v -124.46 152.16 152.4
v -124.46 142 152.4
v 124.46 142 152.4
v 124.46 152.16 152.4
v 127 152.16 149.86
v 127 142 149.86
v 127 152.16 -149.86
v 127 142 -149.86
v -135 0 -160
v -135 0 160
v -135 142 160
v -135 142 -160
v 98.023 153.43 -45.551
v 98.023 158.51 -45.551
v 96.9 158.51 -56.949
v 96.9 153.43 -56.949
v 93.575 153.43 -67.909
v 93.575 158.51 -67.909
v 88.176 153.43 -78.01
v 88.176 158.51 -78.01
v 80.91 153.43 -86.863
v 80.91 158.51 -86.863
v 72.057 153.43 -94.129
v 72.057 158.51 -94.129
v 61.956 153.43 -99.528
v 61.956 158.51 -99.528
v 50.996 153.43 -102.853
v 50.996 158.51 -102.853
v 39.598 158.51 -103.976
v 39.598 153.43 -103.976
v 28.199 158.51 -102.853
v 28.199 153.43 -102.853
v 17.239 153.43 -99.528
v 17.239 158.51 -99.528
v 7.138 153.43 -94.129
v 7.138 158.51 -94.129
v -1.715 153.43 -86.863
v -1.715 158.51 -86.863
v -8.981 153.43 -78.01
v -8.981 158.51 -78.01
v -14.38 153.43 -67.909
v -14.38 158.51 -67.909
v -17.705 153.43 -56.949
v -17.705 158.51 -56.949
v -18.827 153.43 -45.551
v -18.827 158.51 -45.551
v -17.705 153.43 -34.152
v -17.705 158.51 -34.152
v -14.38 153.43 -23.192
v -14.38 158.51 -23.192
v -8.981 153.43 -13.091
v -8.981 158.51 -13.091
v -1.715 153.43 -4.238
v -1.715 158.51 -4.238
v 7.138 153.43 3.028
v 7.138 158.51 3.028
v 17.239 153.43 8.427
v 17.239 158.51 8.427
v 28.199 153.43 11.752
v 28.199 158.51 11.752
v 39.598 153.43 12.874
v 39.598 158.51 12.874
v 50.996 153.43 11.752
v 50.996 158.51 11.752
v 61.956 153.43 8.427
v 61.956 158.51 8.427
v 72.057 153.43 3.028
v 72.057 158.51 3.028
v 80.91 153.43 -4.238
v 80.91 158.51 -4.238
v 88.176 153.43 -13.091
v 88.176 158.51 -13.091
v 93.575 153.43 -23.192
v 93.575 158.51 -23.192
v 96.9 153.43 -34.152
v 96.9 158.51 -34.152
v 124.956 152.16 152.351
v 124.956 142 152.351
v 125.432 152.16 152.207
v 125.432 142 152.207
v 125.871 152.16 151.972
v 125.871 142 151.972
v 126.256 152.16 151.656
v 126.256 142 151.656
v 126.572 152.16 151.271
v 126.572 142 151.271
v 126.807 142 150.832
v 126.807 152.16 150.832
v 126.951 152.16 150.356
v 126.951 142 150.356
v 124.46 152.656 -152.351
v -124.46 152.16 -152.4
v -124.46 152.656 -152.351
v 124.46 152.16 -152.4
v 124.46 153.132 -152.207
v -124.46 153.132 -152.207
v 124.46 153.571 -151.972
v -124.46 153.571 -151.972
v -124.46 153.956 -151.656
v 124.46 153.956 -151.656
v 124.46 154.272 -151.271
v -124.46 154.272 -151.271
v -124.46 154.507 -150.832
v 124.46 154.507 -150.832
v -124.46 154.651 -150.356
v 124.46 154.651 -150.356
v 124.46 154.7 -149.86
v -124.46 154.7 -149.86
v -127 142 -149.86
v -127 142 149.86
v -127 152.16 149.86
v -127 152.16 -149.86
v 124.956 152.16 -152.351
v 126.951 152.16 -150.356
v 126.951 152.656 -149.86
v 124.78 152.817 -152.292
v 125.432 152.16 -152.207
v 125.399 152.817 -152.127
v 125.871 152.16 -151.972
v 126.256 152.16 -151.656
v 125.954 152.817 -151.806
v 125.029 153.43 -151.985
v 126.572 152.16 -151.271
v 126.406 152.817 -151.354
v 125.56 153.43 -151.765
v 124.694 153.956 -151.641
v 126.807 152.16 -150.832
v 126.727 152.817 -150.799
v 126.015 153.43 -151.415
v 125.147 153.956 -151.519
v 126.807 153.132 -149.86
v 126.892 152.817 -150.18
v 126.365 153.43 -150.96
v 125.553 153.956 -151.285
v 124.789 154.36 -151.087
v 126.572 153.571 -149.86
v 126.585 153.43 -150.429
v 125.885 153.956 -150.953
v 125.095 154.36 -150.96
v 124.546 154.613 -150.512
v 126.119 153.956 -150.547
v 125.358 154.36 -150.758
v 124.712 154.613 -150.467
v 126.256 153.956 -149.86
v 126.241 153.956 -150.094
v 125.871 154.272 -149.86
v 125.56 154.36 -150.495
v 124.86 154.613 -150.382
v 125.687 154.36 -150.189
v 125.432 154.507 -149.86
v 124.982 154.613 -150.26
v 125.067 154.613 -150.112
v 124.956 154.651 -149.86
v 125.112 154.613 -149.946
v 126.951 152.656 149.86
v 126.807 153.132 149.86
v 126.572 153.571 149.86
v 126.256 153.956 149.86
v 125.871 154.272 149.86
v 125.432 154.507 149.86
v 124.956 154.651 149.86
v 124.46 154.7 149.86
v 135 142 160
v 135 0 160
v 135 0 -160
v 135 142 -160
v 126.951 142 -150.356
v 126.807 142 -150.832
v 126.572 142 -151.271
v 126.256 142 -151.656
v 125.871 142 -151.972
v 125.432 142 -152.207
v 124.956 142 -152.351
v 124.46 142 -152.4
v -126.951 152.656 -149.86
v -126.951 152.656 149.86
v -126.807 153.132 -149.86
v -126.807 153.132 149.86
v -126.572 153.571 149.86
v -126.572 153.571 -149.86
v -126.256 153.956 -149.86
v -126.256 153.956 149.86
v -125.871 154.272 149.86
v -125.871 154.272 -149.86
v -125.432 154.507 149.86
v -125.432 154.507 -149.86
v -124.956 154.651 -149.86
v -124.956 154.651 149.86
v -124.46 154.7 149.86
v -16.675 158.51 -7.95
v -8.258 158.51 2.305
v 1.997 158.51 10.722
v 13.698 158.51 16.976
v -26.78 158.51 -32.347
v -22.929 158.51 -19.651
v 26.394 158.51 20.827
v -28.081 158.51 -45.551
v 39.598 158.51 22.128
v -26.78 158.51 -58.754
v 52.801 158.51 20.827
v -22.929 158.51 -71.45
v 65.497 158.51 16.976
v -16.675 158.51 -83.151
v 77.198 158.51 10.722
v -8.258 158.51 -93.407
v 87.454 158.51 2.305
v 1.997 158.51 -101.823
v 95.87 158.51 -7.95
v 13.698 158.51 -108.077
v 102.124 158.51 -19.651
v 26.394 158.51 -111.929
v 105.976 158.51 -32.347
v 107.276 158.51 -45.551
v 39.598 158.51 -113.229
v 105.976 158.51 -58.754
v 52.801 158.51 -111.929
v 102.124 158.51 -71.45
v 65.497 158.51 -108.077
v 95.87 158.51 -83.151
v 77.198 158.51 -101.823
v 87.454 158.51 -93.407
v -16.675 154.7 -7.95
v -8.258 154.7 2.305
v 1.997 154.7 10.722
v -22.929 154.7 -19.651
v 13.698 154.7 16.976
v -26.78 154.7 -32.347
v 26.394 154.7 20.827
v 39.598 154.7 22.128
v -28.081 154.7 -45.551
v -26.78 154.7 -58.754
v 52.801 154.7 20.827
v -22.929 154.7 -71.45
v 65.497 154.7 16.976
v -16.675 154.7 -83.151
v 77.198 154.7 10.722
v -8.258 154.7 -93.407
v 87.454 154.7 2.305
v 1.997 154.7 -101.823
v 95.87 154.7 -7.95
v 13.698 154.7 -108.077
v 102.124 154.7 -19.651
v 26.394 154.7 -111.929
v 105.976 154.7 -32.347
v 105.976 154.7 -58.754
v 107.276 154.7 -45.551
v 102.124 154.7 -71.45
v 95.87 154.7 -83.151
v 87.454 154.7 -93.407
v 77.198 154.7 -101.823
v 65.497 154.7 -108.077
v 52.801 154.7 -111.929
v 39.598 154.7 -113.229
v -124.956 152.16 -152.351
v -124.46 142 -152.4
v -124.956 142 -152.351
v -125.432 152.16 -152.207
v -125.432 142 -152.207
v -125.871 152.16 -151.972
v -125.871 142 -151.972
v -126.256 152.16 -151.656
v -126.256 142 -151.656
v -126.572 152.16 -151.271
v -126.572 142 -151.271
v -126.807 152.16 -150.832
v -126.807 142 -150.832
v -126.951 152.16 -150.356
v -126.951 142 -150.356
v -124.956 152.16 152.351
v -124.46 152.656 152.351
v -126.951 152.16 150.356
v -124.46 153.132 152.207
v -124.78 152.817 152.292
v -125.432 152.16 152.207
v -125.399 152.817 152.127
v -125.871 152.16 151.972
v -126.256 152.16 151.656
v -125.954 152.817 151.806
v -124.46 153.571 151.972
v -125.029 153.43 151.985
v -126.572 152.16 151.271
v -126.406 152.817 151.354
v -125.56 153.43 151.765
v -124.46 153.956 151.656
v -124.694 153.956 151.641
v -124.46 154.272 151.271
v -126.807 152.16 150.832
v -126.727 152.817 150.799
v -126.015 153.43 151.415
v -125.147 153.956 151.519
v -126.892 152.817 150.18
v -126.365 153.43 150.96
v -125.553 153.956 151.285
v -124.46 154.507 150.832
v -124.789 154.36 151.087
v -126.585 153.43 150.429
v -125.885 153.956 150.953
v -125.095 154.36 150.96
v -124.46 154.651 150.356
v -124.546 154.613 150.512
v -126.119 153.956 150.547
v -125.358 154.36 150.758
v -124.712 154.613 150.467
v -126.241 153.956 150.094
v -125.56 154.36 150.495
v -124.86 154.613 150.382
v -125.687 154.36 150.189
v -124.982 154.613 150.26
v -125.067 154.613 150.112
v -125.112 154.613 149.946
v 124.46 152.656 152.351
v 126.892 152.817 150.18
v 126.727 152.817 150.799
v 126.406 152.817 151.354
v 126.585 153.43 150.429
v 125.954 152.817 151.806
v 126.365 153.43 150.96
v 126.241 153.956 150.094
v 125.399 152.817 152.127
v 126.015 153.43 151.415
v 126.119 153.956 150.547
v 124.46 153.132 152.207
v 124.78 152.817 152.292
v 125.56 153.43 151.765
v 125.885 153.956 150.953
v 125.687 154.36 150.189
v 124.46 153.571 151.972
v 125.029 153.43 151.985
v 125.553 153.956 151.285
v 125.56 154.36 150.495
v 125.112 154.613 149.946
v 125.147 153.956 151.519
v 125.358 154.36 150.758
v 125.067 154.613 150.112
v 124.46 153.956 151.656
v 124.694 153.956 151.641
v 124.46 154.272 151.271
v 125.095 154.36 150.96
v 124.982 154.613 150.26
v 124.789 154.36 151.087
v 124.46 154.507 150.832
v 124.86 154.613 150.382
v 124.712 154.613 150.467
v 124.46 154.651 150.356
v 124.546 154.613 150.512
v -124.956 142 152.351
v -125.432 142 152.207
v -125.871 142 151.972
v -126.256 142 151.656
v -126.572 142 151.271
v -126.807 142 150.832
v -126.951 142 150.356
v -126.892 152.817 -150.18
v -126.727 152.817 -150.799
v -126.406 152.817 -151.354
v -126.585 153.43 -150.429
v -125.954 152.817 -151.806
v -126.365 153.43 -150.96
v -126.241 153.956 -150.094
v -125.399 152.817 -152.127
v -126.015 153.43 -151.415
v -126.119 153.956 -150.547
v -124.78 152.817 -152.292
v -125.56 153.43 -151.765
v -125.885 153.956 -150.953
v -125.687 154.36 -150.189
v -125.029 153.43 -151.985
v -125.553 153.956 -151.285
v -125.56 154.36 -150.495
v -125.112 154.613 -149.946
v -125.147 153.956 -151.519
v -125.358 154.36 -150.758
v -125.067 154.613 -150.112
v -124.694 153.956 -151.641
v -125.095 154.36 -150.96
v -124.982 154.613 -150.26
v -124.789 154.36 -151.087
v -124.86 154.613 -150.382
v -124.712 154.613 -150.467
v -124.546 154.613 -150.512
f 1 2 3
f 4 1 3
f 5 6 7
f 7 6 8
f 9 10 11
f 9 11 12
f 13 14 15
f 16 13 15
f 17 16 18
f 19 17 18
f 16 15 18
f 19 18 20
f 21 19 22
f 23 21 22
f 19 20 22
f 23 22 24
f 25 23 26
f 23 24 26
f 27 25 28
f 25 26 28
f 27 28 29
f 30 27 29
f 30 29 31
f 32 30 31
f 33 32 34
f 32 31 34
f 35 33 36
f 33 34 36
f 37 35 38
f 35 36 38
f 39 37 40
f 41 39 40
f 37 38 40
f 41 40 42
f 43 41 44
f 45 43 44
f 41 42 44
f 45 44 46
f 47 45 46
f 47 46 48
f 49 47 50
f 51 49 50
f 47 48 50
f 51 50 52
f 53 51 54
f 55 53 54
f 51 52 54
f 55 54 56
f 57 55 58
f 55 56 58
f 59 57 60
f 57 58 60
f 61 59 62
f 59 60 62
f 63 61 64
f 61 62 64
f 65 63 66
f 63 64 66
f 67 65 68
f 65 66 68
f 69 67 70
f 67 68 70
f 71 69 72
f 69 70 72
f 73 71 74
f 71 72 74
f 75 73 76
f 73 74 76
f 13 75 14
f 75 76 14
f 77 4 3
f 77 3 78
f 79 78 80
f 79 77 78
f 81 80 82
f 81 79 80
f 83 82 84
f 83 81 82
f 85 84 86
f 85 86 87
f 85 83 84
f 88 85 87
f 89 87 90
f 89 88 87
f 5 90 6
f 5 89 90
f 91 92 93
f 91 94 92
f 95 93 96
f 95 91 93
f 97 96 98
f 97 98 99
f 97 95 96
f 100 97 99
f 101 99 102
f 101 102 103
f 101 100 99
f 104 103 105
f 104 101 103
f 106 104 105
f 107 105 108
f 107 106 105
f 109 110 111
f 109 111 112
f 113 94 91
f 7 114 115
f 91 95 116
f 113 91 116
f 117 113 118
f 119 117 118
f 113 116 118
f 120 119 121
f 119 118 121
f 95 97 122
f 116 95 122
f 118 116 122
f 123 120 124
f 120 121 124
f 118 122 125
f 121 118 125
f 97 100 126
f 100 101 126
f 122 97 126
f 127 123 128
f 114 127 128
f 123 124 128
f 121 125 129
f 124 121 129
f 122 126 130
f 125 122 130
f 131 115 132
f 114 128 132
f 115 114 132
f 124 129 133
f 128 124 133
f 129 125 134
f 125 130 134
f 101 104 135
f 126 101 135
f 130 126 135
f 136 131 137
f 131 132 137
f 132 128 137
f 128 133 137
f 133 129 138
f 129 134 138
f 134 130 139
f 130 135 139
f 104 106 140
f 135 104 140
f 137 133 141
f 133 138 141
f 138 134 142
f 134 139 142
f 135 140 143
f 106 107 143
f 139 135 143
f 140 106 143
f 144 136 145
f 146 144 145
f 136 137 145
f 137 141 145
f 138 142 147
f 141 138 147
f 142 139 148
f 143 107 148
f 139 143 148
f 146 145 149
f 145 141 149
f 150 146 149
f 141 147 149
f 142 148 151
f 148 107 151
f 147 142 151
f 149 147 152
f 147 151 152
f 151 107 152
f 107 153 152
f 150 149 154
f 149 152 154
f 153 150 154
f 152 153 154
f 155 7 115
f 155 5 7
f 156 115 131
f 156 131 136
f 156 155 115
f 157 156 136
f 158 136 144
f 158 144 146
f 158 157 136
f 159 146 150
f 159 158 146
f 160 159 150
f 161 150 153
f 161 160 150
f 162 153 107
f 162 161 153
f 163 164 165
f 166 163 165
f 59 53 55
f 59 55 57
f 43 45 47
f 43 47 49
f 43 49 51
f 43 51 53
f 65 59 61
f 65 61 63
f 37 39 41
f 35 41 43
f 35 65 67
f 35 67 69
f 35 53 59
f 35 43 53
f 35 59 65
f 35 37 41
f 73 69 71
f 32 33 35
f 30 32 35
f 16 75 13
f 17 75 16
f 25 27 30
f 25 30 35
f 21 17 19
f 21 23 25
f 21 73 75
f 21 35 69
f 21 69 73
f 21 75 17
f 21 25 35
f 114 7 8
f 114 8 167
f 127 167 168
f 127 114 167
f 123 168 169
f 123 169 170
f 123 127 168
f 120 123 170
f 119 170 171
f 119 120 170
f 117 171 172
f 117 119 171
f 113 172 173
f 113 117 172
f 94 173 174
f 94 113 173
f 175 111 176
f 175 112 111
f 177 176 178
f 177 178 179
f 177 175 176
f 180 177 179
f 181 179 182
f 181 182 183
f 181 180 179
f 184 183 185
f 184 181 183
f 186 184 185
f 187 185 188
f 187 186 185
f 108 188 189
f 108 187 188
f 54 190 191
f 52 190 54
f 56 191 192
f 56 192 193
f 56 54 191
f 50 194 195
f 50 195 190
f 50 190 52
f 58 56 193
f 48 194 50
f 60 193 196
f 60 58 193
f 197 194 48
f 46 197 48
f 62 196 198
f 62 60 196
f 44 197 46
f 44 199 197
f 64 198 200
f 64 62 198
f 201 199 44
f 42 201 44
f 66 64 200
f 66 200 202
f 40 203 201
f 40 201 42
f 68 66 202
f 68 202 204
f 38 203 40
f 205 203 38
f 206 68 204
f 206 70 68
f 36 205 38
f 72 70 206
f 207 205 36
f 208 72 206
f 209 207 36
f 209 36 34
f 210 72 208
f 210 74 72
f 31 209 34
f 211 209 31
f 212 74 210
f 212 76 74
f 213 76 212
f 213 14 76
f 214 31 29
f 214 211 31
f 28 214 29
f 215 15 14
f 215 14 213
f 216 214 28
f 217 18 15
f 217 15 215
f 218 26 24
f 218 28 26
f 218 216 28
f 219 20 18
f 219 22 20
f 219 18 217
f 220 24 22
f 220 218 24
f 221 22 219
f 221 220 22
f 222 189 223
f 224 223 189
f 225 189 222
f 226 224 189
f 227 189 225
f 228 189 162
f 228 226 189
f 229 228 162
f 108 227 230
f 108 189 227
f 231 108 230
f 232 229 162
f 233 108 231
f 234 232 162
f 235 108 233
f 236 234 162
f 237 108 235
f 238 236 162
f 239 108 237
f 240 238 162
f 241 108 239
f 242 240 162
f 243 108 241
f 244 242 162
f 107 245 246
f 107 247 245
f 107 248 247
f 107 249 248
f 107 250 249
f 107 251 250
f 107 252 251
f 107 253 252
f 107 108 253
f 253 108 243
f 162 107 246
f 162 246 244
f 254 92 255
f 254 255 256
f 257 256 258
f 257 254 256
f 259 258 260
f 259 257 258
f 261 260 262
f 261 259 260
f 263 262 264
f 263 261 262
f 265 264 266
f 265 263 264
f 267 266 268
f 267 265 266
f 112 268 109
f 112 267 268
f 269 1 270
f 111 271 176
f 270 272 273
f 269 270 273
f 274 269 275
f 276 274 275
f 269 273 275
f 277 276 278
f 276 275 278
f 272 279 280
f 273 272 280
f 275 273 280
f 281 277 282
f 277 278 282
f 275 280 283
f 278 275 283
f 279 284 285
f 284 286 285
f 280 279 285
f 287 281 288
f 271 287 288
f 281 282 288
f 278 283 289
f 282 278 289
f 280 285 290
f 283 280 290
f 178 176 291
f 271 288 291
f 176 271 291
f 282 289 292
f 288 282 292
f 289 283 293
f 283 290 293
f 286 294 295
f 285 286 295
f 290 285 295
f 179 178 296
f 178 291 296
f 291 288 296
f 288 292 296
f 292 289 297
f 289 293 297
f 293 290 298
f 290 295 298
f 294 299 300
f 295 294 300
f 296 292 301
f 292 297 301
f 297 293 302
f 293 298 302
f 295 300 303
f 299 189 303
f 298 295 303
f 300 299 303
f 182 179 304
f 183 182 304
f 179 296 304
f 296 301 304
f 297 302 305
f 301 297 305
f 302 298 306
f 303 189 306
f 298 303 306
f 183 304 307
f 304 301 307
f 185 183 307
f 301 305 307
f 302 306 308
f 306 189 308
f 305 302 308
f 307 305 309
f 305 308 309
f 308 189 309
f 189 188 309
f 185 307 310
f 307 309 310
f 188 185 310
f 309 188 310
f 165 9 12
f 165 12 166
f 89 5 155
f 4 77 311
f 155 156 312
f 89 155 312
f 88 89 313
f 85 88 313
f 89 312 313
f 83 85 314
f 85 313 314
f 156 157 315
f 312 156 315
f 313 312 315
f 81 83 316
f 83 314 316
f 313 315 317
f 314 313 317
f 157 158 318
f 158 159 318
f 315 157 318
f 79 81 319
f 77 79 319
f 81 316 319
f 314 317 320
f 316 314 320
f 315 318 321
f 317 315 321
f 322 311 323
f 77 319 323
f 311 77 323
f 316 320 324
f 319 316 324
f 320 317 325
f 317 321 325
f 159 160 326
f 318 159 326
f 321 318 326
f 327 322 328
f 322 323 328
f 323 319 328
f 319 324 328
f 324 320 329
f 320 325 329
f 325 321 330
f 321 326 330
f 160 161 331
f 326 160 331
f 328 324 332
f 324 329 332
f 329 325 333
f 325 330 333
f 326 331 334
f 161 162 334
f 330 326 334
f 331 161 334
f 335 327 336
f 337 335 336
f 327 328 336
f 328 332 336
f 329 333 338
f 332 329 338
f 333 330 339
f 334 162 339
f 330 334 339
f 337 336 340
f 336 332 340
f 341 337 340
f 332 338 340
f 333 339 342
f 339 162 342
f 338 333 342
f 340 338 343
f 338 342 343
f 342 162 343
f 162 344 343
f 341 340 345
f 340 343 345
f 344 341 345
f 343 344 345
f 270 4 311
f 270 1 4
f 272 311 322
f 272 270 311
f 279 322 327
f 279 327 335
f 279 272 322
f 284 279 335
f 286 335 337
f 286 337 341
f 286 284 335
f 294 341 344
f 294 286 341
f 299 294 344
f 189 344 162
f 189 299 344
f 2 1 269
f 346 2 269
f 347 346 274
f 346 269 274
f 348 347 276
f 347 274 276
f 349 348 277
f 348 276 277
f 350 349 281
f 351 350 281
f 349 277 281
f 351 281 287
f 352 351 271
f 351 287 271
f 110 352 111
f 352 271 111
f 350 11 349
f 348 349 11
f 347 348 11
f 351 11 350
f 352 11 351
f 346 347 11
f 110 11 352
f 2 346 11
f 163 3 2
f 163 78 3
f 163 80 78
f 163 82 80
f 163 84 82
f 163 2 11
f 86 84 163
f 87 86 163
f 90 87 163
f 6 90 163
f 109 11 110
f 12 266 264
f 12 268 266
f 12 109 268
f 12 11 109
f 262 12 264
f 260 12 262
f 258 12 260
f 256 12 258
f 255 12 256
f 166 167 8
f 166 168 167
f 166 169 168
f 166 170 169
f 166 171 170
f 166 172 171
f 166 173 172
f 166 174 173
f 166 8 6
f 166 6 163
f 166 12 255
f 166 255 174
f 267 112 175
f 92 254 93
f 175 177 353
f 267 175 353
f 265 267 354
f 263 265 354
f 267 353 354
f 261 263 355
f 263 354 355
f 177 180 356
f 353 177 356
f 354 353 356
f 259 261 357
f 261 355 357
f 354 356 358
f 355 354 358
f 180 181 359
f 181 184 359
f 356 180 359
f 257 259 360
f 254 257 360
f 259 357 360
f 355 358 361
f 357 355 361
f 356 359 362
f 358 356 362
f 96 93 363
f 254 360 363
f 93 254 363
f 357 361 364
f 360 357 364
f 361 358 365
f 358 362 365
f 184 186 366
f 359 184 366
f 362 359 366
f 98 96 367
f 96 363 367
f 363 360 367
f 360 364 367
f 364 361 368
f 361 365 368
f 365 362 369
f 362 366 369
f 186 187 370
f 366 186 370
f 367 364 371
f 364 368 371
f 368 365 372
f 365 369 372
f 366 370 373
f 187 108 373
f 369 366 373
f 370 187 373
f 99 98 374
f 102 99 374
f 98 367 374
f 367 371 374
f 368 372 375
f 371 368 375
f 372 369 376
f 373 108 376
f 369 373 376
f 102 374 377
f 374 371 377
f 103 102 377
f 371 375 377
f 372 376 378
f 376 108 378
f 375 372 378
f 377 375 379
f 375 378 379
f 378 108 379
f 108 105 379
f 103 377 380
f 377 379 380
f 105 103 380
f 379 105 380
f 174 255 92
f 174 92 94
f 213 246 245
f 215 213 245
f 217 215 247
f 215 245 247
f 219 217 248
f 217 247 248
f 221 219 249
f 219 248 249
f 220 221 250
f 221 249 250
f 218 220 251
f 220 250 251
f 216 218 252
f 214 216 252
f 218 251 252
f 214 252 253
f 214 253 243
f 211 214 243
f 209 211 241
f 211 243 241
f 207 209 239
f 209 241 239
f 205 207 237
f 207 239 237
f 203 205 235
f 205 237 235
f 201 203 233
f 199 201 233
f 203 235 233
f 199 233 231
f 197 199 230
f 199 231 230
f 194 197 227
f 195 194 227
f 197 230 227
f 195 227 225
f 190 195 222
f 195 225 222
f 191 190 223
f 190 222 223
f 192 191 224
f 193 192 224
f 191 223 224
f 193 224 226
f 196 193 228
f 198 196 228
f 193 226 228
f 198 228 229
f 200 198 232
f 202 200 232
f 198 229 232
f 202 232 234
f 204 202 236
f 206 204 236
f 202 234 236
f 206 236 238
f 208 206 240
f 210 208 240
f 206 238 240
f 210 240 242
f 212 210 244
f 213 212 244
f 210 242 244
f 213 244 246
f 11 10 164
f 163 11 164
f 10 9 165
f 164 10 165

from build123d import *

# Parameters (mm, degrees)
SKETCH1_W           = 270
SKETCH1_H           = 320
BOSS_EXTRUDE1_DEPTH = 142
SKETCH3_W           = 254
SKETCH3_H           = 304.8
BOSS_EXTRUDE3_DEPTH = 12.7
FILLET1_R           = 2.54
FILLET2_R           = 2.54
SKETCH7_R           = 67.678561976
BOSS_EXTRUDE4_DEPTH = 3.81
SKETCH8_R           = 58.425044715
CUT_EXTRUDE2_DEPTH  = 5.08


with BuildPart() as part:
    # Sketch1 → Boss-Extrude1 (new body)
    with BuildSketch(Plane(origin=(0, 0, 0), x_dir=(1, 0, 0), z_dir=(0, 1, 0))):
        Rectangle(SKETCH1_W, SKETCH1_H)
    extrude(amount=BOSS_EXTRUDE1_DEPTH)

    # Sketch3 → Boss-Extrude3 (add)
    with BuildSketch(Plane(origin=(0, 142, 0), x_dir=(1, 0, 0), z_dir=(0, 1, 0))):
        Rectangle(SKETCH3_W, SKETCH3_H)
    extrude(amount=BOSS_EXTRUDE3_DEPTH)

    # Fillet1
    fillet1_edges = [part.edges().sort_by_distance(p)[0] for p in [
        (127, 148.35, 152.4),
        (127, 148.35, -152.4),
        (-127, 148.35, -152.4),
        (-127, 148.35, 152.4),
    ]]
    fillet(fillet1_edges, radius=FILLET1_R)

    # Fillet2
    fillet2_edges = [part.edges().sort_by_distance(p)[0] for p in [
        (0, 154.7, -152.4),
        (127, 154.7, 0),
        (-127, 154.7, 0),
        (0, 154.7, 152.4),
        (126.256051224, 154.7, 151.656051224),
        (-126.256051224, 154.7, 151.656051224),
        (-126.256051224, 154.7, -151.656051224),
        (126.256051224, 154.7, -151.656051224),
    ]]
    fillet(fillet2_edges, radius=FILLET2_R)

    # Sketch7 → Boss-Extrude4 (add)
    with BuildSketch(Plane(origin=(0, 154.7, 0), x_dir=(1, 0, 0), z_dir=(0, 1, 0))):
        with Locations((39.597638404, 45.550655758)):
            Circle(SKETCH7_R)
    extrude(amount=BOSS_EXTRUDE4_DEPTH)

    # Sketch8 → Cut-Extrude2 (cut)
    with BuildSketch(Plane(origin=(0, 158.51, 0), x_dir=(1, 0, 0), z_dir=(0, 1, 0))):
        with Locations((39.597638404, 45.550655758)):
            Circle(SKETCH8_R)
    extrude(amount=-CUT_EXTRUDE2_DEPTH, mode=Mode.SUBTRACT)


solid = part.part
